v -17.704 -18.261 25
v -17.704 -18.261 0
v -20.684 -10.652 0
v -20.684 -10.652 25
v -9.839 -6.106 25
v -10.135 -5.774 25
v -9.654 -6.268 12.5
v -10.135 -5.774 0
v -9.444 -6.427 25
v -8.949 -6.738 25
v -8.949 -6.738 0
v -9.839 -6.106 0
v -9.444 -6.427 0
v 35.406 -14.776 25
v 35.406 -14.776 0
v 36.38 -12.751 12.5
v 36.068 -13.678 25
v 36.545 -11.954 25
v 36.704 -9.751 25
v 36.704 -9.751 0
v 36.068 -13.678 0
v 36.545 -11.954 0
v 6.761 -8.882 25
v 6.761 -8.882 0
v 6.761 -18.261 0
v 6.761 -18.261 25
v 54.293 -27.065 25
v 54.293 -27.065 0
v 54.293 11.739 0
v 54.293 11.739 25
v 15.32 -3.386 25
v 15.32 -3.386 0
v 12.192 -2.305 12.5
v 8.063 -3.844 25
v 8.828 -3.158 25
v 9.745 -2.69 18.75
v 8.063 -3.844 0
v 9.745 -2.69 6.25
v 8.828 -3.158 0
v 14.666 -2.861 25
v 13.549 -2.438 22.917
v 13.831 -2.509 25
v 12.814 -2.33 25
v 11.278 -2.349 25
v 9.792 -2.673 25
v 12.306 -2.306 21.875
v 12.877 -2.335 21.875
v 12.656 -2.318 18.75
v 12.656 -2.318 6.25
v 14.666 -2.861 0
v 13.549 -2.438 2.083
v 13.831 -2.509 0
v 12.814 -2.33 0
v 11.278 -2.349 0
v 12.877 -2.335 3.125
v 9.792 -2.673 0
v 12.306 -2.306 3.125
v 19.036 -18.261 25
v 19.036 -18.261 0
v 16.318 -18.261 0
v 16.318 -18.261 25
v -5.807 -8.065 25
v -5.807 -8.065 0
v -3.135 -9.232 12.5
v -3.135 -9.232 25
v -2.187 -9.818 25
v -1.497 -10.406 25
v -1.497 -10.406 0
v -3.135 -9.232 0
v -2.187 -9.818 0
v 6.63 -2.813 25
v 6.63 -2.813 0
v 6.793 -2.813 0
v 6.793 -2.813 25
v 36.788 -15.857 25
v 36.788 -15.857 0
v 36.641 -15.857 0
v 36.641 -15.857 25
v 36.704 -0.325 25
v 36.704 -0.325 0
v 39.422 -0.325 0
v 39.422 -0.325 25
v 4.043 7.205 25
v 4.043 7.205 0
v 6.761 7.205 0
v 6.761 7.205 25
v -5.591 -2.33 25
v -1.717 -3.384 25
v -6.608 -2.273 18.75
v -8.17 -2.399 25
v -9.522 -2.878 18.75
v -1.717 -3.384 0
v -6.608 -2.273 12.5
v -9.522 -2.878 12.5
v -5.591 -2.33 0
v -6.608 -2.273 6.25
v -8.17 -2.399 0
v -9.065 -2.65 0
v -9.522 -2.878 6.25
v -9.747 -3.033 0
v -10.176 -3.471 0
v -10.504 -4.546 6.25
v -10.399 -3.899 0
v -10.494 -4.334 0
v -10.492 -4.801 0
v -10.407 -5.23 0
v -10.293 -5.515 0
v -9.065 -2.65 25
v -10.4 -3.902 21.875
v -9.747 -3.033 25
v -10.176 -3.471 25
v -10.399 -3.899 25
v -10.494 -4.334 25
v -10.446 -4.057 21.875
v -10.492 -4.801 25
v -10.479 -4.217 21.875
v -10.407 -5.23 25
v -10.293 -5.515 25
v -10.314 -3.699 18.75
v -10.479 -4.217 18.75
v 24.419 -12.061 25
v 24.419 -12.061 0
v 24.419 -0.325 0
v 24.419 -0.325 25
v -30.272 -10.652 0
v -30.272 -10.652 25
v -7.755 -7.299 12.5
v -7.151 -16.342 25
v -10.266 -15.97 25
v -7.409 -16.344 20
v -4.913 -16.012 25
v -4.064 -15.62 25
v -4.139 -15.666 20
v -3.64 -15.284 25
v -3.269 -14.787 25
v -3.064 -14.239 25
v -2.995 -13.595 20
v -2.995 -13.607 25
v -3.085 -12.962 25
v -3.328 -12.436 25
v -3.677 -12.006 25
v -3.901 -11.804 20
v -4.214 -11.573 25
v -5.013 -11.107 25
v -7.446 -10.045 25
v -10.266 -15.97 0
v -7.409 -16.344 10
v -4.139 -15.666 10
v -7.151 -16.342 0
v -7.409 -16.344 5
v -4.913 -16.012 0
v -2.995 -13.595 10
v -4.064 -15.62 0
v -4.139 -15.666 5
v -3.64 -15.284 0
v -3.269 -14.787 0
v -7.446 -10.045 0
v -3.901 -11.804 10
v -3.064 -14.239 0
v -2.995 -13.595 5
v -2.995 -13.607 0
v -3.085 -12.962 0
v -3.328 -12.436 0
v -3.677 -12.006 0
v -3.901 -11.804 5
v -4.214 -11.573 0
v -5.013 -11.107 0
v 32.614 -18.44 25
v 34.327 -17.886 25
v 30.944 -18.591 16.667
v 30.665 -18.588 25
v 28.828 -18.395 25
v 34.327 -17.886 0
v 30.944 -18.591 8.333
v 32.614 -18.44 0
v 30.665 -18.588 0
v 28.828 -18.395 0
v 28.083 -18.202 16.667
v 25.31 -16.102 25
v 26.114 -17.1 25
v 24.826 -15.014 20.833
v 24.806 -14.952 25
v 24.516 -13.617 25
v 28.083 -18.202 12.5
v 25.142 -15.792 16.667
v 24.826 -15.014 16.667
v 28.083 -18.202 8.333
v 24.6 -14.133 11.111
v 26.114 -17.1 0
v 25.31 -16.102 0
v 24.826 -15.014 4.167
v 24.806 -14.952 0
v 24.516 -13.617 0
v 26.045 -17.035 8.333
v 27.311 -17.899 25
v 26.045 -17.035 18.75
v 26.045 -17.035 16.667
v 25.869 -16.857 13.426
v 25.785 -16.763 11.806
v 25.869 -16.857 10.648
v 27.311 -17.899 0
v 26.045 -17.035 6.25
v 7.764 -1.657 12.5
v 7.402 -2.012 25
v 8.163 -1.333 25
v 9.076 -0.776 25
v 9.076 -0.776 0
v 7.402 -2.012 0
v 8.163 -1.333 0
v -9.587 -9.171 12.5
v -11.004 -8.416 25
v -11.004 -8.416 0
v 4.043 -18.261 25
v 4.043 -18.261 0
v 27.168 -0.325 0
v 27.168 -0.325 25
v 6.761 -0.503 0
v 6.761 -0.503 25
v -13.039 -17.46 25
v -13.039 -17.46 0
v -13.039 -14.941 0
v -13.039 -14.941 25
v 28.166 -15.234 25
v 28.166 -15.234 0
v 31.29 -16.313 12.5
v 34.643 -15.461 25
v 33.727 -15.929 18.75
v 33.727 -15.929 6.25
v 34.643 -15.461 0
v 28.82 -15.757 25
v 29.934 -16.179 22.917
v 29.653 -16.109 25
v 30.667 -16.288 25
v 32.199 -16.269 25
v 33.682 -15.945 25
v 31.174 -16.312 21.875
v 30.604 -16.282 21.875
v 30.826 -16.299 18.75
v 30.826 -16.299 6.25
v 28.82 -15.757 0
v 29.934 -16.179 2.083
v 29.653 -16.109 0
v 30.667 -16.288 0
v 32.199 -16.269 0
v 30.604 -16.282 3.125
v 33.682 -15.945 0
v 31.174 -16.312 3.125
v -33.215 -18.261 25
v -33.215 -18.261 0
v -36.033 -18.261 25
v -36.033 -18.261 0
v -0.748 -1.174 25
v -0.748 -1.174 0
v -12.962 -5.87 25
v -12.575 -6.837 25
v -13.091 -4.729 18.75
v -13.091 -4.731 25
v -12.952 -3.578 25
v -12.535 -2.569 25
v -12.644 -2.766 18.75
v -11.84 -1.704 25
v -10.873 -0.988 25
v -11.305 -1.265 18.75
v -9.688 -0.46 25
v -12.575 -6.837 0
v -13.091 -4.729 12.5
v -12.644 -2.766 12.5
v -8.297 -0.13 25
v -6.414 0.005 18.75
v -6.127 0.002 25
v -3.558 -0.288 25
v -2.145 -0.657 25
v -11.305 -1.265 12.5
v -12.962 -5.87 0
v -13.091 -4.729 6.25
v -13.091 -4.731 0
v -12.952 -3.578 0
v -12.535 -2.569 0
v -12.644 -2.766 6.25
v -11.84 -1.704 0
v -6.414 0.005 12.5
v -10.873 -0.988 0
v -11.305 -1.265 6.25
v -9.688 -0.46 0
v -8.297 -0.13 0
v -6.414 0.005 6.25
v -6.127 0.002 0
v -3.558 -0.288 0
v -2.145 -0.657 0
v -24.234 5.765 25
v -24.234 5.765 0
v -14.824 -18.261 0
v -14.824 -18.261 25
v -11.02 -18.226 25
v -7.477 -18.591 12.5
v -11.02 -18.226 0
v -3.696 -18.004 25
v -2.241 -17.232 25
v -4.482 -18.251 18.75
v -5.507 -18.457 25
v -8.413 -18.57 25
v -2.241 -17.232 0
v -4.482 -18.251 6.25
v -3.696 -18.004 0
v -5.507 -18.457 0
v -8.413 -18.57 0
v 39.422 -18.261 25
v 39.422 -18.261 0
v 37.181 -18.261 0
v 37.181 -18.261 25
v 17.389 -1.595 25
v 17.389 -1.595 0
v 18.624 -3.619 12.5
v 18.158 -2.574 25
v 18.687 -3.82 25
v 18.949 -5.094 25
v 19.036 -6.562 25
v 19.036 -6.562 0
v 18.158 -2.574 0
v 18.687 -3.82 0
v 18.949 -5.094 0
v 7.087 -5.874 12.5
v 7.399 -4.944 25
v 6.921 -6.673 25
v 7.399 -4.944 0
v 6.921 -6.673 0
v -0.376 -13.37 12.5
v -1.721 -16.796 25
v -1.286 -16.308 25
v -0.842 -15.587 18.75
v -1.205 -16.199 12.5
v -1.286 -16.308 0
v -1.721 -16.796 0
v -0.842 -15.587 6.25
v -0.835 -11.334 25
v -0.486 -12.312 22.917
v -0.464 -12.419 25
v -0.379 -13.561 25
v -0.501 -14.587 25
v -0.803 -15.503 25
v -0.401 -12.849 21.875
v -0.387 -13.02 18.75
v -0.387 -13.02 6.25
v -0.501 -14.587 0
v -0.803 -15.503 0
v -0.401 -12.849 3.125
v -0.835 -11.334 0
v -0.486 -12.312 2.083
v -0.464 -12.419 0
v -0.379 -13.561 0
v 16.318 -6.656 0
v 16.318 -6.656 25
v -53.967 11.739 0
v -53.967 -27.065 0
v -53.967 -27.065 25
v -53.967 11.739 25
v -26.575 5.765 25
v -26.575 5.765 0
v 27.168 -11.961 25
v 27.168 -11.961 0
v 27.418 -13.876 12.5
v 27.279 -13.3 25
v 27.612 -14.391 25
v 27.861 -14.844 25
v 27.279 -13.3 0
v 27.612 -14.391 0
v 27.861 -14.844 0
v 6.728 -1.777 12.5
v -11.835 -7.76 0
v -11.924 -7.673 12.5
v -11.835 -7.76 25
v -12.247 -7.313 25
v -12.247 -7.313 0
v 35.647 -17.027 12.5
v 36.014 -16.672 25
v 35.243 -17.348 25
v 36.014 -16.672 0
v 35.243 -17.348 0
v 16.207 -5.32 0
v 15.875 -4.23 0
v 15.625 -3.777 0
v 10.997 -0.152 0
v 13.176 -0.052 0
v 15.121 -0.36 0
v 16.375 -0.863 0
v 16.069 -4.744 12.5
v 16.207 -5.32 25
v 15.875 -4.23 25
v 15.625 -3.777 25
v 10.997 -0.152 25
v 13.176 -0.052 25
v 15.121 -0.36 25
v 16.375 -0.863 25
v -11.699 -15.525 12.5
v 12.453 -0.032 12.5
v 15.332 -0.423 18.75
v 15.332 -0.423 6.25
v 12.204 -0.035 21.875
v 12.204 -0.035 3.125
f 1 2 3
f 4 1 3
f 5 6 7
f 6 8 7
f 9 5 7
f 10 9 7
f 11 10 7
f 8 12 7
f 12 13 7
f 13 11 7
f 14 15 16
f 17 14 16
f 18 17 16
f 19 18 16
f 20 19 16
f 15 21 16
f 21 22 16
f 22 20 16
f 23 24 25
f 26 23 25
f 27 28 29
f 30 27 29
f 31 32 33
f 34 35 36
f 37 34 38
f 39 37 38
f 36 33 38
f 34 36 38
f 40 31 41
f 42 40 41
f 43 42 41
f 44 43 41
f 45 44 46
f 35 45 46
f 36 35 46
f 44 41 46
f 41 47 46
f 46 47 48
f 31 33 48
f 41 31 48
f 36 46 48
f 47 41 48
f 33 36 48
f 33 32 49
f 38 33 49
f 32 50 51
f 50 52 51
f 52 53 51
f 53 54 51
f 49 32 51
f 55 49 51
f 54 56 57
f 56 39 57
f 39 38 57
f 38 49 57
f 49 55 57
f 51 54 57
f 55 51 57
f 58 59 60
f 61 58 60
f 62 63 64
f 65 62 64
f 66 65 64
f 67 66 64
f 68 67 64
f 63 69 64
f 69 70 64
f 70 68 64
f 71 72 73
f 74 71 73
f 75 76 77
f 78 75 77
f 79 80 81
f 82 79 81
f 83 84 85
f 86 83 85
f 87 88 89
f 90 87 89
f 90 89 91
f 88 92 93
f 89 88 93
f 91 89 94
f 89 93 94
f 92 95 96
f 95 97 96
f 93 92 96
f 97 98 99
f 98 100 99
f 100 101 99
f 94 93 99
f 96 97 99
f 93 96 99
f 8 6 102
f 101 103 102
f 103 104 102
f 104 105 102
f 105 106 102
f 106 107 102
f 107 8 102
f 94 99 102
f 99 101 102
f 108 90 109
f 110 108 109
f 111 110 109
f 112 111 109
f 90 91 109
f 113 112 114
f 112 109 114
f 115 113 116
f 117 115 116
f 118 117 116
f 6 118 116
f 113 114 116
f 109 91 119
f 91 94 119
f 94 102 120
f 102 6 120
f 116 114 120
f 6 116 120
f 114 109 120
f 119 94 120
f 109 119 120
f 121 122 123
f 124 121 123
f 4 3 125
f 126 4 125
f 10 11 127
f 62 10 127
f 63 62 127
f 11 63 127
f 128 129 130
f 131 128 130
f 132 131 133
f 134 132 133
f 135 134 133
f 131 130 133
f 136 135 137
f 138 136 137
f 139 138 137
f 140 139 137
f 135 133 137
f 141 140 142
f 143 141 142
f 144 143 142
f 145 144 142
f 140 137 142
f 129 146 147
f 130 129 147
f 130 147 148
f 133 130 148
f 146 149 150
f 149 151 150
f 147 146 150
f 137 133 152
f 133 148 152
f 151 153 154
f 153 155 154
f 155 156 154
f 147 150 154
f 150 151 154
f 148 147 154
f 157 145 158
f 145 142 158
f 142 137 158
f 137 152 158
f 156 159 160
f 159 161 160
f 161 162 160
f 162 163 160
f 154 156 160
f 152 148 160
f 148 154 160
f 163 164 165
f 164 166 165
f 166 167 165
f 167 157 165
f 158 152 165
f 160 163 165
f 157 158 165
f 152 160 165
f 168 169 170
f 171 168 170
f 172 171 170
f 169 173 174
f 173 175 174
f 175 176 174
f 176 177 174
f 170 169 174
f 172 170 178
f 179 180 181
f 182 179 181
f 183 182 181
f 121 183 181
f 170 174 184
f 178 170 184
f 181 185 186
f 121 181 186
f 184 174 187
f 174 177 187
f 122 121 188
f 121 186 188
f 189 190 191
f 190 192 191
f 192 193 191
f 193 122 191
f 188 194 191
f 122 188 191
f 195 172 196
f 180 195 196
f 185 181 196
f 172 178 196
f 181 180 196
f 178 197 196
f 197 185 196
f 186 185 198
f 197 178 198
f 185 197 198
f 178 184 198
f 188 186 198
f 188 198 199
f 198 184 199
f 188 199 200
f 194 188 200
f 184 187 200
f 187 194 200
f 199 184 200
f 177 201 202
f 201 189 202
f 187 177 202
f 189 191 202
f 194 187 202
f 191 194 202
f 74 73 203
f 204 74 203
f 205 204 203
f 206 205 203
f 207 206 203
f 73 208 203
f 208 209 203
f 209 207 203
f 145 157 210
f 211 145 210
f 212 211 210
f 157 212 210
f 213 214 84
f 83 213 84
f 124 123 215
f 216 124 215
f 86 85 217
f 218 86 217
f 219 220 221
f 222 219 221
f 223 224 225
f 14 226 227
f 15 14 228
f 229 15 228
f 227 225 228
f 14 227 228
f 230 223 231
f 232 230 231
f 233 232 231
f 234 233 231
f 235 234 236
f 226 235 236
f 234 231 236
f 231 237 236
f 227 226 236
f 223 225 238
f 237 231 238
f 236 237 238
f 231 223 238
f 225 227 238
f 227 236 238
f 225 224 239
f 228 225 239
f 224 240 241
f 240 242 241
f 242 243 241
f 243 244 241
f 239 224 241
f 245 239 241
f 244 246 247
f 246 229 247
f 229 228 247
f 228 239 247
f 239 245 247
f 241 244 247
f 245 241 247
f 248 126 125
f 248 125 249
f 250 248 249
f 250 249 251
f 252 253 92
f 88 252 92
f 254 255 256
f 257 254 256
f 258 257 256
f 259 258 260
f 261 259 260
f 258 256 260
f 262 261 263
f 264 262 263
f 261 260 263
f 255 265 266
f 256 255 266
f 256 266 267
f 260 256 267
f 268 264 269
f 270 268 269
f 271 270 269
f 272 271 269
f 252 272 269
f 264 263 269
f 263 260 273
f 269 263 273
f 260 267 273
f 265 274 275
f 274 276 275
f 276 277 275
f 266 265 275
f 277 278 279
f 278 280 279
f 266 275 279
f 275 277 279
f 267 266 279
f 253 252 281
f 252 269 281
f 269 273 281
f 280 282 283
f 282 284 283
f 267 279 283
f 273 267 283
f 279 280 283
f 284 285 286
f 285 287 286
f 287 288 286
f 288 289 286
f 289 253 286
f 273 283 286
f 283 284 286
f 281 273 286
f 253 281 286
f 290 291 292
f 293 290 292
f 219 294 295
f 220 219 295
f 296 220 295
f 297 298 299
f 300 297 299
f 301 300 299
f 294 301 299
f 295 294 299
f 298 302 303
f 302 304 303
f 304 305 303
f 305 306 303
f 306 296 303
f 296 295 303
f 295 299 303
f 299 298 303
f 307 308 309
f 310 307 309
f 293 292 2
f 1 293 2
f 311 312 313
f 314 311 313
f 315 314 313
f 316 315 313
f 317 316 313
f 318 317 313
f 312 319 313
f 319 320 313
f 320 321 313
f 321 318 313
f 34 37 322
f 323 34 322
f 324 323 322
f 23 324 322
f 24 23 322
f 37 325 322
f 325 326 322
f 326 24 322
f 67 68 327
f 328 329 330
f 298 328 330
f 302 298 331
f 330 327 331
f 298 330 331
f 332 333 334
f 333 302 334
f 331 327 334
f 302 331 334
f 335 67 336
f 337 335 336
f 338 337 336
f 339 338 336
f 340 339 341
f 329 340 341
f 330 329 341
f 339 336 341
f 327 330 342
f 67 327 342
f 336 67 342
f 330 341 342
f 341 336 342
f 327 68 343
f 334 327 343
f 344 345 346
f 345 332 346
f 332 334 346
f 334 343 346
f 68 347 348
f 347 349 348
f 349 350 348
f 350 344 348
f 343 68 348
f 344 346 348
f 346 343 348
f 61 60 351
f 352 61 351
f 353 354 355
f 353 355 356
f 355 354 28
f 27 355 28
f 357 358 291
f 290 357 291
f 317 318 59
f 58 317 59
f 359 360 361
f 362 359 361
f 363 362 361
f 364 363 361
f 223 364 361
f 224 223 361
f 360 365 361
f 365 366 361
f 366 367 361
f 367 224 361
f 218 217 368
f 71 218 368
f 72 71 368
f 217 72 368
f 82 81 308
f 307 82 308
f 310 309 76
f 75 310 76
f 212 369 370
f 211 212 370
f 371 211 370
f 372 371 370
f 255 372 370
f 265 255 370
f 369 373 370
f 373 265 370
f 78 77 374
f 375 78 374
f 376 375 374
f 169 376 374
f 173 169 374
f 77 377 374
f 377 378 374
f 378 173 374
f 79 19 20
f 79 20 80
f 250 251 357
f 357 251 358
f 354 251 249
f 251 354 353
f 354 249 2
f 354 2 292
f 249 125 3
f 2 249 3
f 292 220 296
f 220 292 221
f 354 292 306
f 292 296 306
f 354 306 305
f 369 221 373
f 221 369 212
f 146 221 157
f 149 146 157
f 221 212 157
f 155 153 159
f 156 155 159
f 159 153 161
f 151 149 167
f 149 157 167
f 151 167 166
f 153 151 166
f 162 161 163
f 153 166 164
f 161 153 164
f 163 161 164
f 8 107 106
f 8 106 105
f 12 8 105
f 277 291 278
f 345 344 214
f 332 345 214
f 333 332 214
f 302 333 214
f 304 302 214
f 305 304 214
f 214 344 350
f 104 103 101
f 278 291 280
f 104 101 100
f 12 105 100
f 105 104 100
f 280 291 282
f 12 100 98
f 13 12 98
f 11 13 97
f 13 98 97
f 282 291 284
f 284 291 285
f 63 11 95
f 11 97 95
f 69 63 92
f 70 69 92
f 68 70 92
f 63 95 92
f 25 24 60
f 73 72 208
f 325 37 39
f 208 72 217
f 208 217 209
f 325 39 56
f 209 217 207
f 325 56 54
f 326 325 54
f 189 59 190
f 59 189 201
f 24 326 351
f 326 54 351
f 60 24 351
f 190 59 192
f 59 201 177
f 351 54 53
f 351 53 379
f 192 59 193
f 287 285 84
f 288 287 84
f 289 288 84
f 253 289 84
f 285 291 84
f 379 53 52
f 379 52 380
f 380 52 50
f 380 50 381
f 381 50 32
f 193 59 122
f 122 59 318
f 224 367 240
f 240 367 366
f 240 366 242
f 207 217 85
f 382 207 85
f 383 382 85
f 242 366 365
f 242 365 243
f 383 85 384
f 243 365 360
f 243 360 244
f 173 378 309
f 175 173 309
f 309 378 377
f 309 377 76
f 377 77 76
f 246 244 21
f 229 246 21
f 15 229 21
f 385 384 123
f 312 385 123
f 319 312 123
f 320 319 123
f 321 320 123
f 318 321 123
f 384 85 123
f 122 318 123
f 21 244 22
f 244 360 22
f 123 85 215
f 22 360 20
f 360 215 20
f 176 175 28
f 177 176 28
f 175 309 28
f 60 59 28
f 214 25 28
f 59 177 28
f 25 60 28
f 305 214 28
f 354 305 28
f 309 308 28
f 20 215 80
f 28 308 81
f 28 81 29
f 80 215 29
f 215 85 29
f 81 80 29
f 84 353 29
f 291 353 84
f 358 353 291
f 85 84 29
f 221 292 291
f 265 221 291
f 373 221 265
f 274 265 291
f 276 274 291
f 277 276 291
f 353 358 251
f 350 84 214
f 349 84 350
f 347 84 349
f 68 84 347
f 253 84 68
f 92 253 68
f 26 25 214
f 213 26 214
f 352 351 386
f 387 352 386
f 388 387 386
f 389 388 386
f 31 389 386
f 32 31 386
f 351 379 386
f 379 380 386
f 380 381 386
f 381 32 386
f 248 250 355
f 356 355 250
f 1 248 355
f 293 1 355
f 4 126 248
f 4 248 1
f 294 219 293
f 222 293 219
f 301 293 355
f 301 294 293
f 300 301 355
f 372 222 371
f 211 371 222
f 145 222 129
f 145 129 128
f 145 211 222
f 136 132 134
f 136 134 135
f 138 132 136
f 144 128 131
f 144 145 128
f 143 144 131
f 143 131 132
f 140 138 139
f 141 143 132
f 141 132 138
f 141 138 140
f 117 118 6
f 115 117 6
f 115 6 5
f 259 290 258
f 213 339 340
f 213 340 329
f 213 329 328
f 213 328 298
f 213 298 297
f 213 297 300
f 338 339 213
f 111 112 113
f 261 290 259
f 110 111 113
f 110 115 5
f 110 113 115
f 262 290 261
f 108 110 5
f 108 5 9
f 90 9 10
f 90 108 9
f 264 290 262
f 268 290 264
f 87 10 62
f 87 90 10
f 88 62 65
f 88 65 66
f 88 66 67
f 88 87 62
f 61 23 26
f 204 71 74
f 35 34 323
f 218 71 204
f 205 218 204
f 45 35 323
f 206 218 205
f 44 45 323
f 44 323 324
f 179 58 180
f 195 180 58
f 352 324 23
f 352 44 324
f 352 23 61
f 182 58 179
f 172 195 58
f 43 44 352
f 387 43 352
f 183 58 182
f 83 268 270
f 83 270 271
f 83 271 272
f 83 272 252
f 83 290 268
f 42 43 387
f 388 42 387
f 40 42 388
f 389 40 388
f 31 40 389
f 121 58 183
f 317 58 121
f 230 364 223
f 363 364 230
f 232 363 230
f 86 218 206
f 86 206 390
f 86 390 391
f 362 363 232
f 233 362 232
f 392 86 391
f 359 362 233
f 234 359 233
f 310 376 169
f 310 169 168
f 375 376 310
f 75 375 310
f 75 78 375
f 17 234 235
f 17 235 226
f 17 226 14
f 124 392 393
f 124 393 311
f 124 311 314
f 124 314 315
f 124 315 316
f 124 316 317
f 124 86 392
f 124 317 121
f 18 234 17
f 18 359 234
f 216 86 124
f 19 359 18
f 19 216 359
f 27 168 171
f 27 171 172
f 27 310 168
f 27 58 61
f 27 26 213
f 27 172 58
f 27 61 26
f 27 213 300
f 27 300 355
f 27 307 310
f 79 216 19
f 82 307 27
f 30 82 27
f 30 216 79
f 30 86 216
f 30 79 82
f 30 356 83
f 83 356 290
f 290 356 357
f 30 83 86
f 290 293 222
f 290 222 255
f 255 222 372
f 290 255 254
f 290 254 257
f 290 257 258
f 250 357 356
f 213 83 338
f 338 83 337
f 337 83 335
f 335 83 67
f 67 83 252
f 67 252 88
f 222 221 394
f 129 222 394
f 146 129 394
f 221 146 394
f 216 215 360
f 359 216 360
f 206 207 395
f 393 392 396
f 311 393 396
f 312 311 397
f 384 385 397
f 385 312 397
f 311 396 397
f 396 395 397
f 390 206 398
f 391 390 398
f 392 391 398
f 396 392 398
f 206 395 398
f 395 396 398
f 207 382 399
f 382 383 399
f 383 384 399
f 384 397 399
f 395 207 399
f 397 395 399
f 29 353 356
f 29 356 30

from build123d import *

# Parameters (mm, degrees)
F0_W     = 108.2608737051
F0_H     = 38.8043485582
F1_DEPTH = 25


with BuildPart() as f1:
    # F0 (on Top) → F1 (new body)
    with BuildSketch(Plane.XY):
        with Locations((0.1630429178, -7.6630432159)):
            Rectangle(F0_W, F0_H)
        with BuildLine():
            add(Edge.make_bspline(
                [(-1.4969709304, -10.405910604), (-0.3763300382, -11.5841545327), (-0.3763300382, -13.3698486647)],
                knots=[0, 0, 0, 1, 1, 1], degree=2))
            add(Edge.make_bspline(
                [(-0.3763300382, -13.3698486647), (-0.3763300382, -15.8729624333), (-2.2405737654, -17.2318704311)],
                knots=[0, 0, 0, 1, 1, 1], degree=2))
            add(Edge.make_bspline(
                [(-2.2405737654, -17.2318704311), (-4.1048174927, -18.5907784289), (-7.4772134487, -18.5907784289)],
                knots=[0, 0, 0, 1, 1, 1], degree=2))
            add(Edge.make_bspline(
                [(-7.4772134487, -18.5907784289), (-11.043365073, -18.5907784289), (-13.0385247923, -17.4596642573)],
                knots=[0, 0, 0, 1, 1, 1], degree=2))
            Line((-13.0385247923, -17.4596642573), (-13.0385247923, -14.9408405697))
            add(Edge.make_bspline(
                [(-13.0385247923, -14.9408405697), (-11.7450747906, -15.5954205301), (-10.2657240801, -15.9698402674)],
                knots=[0, 0, 0, 1, 1, 1], degree=2))
            add(Edge.make_bspline(
                [(-10.2657240801, -15.9698402674), (-8.7863733695, -16.3442600048), (-7.4091371328, -16.3442600048)],
                knots=[0, 0, 0, 1, 1, 1], degree=2))
            add(Edge.make_bspline(
                [(-7.4091371328, -16.3442600048), (-5.2830614214, -16.3442600048), (-4.1388556506, -15.6661151658)],
                knots=[0, 0, 0, 1, 1, 1], degree=2))
            add(Edge.make_bspline(
                [(-4.1388556506, -15.6661151658), (-2.9946498798, -14.9879703268), (-2.9946498798, -13.5950241711)],
                knots=[0, 0, 0, 1, 1, 1], degree=2))
            add(Edge.make_bspline(
                [(-2.9946498798, -13.5950241711), (-2.9946498798, -12.5476962344), (-3.900588545, -11.8040933994)],
                knots=[0, 0, 0, 1, 1, 1], degree=2))
            add(Edge.make_bspline(
                [(-3.900588545, -11.8040933994), (-4.8065272102, -11.0604905644), (-7.4457936106, -10.0445824658)],
                knots=[0, 0, 0, 1, 1, 1], degree=2))
            add(Edge.make_bspline(
                [(-7.4457936106, -10.0445824658), (-9.9489073792, -9.1124606022), (-11.0040902754, -8.4159875243)],
                knots=[0, 0, 0, 1, 1, 1], degree=2))
            add(Edge.make_bspline(
                [(-11.0040902754, -8.4159875243), (-12.0592731716, -7.7195144465), (-12.5750821804, -6.8371406598)],
                knots=[0, 0, 0, 1, 1, 1], degree=2))
            add(Edge.make_bspline(
                [(-12.5750821804, -6.8371406598), (-13.0908911892, -5.9547668732), (-13.0908911892, -4.7293931873)],
                knots=[0, 0, 0, 1, 1, 1], degree=2))
            add(Edge.make_bspline(
                [(-13.0908911892, -4.7293931873), (-13.0908911892, -2.53524116), (-11.3051970572, -1.2653560368)],
                knots=[0, 0, 0, 1, 1, 1], degree=2))
            add(Edge.make_bspline(
                [(-11.3051970572, -1.2653560368), (-9.5195029252, 0.0045290864), (-6.414175593, 0.0045290864)],
                knots=[0, 0, 0, 1, 1, 1], degree=2))
            add(Edge.make_bspline(
                [(-6.414175593, 0.0045290864), (-3.5183138482, 0.0045290864), (-0.7481314557, -1.1737148424)],
                knots=[0, 0, 0, 1, 1, 1], degree=2))
            Line((-0.7481314557, -1.1737148424), (-1.7169097971, -3.3835767887))
            add(Edge.make_bspline(
                [(-1.7169097971, -3.3835767887), (-4.413779234, -2.2734091759), (-6.6079312613, -2.2734091759)],
                knots=[0, 0, 0, 1, 1, 1], degree=2))
            add(Edge.make_bspline(
                [(-6.6079312613, -2.2734091759), (-8.5402513044, -2.2734091759), (-9.522121245, -2.8782410593)],
                knots=[0, 0, 0, 1, 1, 1], degree=2))
            add(Edge.make_bspline(
                [(-9.522121245, -2.8782410593), (-10.5039911856, -3.4830729427), (-10.5039911856, -4.5461107984)],
                knots=[0, 0, 0, 1, 1, 1], degree=2))
            add(Edge.make_bspline(
                [(-10.5039911856, -4.5461107984), (-10.5039911856, -5.2687670747), (-10.134808088, -5.7741028041)],
                knots=[0, 0, 0, 1, 1, 1], degree=2))
            add(Edge.make_bspline(
                [(-10.134808088, -5.7741028041), (-9.7656249903, -6.2794385336), (-8.9487091997, -6.7376445058)],
                knots=[0, 0, 0, 1, 1, 1], degree=2))
            add(Edge.make_bspline(
                [(-8.9487091997, -6.7376445058), (-8.1317934091, -7.1958504781), (-5.8067253898, -8.0651326656)],
                knots=[0, 0, 0, 1, 1, 1], degree=2))
            add(Edge.make_bspline(
                [(-5.8067253898, -8.0651326656), (-2.6176118226, -9.2276666752), (-1.4969709304, -10.405910604)],
                knots=[0, 0, 0, 1, 1, 1], degree=2))
        make_face(mode=Mode.SUBTRACT)
        with BuildLine():
            Line((24.419158862, -0.3253792137), (27.1683946958, -0.3253792137))
            Line((27.1683946958, -0.3253792137), (27.1683946958, -11.9611925899))
            add(Edge.make_bspline(
                [(27.1683946958, -11.9611925899), (27.1683946958, -14.1553446172), (28.1659745554, -15.2340923919)],
                knots=[0, 0, 0, 1, 1, 1], degree=2))
            add(Edge.make_bspline(
                [(28.1659745554, -15.2340923919), (29.1635544151, -16.3128401667), (31.2896301265, -16.3128401667)],
                knots=[0, 0, 0, 1, 1, 1], degree=2))
            add(Edge.make_bspline(
                [(31.2896301265, -16.3128401667), (34.1069422761, -16.3128401667), (35.4056289175, -14.7758864197)],
                knots=[0, 0, 0, 1, 1, 1], degree=2))
            add(Edge.make_bspline(
                [(35.4056289175, -14.7758864197), (36.704315559, -13.2389326726), (36.704315559, -9.7513306436)],
                knots=[0, 0, 0, 1, 1, 1], degree=2))
            Line((36.704315559, -9.7513306436), (36.704315559, -0.3253792137))
            Line((36.704315559, -0.3253792137), (39.4221315546, -0.3253792137))
            Line((39.4221315546, -0.3253792137), (39.4221315546, -18.2608701289))
            Line((39.4221315546, -18.2608701289), (37.1808497702, -18.2608701289))
            Line((37.1808497702, -18.2608701289), (36.7881017939, -15.8572525143))
            Line((36.7881017939, -15.8572525143), (36.6414758828, -15.8572525143))
            add(Edge.make_bspline(
                [(36.6414758828, -15.8572525143), (35.8088501731, -17.1821223541), (34.3268811428, -17.8864503915)],
                knots=[0, 0, 0, 1, 1, 1], degree=2))
            add(Edge.make_bspline(
                [(34.3268811428, -17.8864503915), (32.8449121124, -18.5907784289), (30.9440119074, -18.5907784289)],
                knots=[0, 0, 0, 1, 1, 1], degree=2))
            add(Edge.make_bspline(
                [(30.9440119074, -18.5907784289), (27.6711121054, -18.5907784289), (26.0451354837, -17.035496443)],
                knots=[0, 0, 0, 1, 1, 1], degree=2))
            add(Edge.make_bspline(
                [(26.0451354837, -17.035496443), (24.419158862, -15.4802144571), (24.419158862, -12.0606887439)],
                knots=[0, 0, 0, 1, 1, 1], degree=2))
            Line((24.419158862, -12.0606887439), (24.419158862, -0.3253792137))
        make_face(mode=Mode.SUBTRACT)
        Polygon((-14.8242189243, -18.2608701289), (-17.7043707501, -18.2608701289), (-20.6840187299, -10.6520326691), (-30.27230599, -10.6520326691), (-33.215297492, -18.2608701289), (-36.0326096416, -18.2608701289), (-26.5752383736, 5.7648327379), (-24.2344604352, 5.7648327379), align=None, mode=Mode.SUBTRACT)
        with BuildLine():
            Line((19.0358932677, -18.2608701289), (16.318077272, -18.2608701289))
            Line((16.318077272, -18.2608701289), (16.318077272, -6.6564765908))
            add(Edge.make_bspline(
                [(16.318077272, -6.6564765908), (16.318077272, -4.4675612032), (15.3204974124, -3.3861951086)],
                knots=[0, 0, 0, 1, 1, 1], degree=2))
            add(Edge.make_bspline(
                [(15.3204974124, -3.3861951086), (14.3229175527, -2.304829014), (12.1916052016, -2.304829014)],
                knots=[0, 0, 0, 1, 1, 1], degree=2))
            add(Edge.make_bspline(
                [(12.1916052016, -2.304829014), (9.3638197727, -2.304829014), (8.0625148114, -3.8444010808)],
                knots=[0, 0, 0, 1, 1, 1], degree=2))
            add(Edge.make_bspline(
                [(8.0625148114, -3.8444010808), (6.7612098501, -5.3839731477), (6.7612098501, -8.8820484561)],
                knots=[0, 0, 0, 1, 1, 1], degree=2))
            Line((6.7612098501, -8.8820484561), (6.7612098501, -18.2608701289))
            Line((6.7612098501, -18.2608701289), (4.0433938545, -18.2608701289))
            Line((4.0433938545, -18.2608701289), (4.0433938545, 7.2049086508))
            Line((4.0433938545, 7.2049086508), (6.7612098501, 7.2049086508))
            Line((6.7612098501, 7.2049086508), (6.7612098501, -0.5034249629))
            add(Edge.make_bspline(
                [(6.7612098501, -0.5034249629), (6.7612098501, -1.8963711187), (6.630293858, -2.8127830632)],
                knots=[0, 0, 0, 1, 1, 1], degree=2))
            Line((6.630293858, -2.8127830632), (6.7926296882, -2.8127830632))
            add(Edge.make_bspline(
                [(6.7926296882, -2.8127830632), (7.5938355597, -1.5193330615), (9.0758045901, -0.7757302265)],
                knots=[0, 0, 0, 1, 1, 1], degree=2))
            add(Edge.make_bspline(
                [(9.0758045901, -0.7757302265), (10.5577736204, -0.0321273914), (12.4534371858, -0.0321273914)],
                knots=[0, 0, 0, 1, 1, 1], degree=2))
            add(Edge.make_bspline(
                [(12.4534371858, -0.0321273914), (15.7420469069, -0.0321273914), (17.3889700873, -1.5952643369)],
                knots=[0, 0, 0, 1, 1, 1], degree=2))
            add(Edge.make_bspline(
                [(17.3889700873, -1.5952643369), (19.0358932677, -3.1584012823), (19.0358932677, -6.5622170765)],
                knots=[0, 0, 0, 1, 1, 1], degree=2))
            Line((19.0358932677, -6.5622170765), (19.0358932677, -18.2608701289))
        make_face(mode=Mode.SUBTRACT)
    extrude(amount=F1_DEPTH)


solid = f1.part
